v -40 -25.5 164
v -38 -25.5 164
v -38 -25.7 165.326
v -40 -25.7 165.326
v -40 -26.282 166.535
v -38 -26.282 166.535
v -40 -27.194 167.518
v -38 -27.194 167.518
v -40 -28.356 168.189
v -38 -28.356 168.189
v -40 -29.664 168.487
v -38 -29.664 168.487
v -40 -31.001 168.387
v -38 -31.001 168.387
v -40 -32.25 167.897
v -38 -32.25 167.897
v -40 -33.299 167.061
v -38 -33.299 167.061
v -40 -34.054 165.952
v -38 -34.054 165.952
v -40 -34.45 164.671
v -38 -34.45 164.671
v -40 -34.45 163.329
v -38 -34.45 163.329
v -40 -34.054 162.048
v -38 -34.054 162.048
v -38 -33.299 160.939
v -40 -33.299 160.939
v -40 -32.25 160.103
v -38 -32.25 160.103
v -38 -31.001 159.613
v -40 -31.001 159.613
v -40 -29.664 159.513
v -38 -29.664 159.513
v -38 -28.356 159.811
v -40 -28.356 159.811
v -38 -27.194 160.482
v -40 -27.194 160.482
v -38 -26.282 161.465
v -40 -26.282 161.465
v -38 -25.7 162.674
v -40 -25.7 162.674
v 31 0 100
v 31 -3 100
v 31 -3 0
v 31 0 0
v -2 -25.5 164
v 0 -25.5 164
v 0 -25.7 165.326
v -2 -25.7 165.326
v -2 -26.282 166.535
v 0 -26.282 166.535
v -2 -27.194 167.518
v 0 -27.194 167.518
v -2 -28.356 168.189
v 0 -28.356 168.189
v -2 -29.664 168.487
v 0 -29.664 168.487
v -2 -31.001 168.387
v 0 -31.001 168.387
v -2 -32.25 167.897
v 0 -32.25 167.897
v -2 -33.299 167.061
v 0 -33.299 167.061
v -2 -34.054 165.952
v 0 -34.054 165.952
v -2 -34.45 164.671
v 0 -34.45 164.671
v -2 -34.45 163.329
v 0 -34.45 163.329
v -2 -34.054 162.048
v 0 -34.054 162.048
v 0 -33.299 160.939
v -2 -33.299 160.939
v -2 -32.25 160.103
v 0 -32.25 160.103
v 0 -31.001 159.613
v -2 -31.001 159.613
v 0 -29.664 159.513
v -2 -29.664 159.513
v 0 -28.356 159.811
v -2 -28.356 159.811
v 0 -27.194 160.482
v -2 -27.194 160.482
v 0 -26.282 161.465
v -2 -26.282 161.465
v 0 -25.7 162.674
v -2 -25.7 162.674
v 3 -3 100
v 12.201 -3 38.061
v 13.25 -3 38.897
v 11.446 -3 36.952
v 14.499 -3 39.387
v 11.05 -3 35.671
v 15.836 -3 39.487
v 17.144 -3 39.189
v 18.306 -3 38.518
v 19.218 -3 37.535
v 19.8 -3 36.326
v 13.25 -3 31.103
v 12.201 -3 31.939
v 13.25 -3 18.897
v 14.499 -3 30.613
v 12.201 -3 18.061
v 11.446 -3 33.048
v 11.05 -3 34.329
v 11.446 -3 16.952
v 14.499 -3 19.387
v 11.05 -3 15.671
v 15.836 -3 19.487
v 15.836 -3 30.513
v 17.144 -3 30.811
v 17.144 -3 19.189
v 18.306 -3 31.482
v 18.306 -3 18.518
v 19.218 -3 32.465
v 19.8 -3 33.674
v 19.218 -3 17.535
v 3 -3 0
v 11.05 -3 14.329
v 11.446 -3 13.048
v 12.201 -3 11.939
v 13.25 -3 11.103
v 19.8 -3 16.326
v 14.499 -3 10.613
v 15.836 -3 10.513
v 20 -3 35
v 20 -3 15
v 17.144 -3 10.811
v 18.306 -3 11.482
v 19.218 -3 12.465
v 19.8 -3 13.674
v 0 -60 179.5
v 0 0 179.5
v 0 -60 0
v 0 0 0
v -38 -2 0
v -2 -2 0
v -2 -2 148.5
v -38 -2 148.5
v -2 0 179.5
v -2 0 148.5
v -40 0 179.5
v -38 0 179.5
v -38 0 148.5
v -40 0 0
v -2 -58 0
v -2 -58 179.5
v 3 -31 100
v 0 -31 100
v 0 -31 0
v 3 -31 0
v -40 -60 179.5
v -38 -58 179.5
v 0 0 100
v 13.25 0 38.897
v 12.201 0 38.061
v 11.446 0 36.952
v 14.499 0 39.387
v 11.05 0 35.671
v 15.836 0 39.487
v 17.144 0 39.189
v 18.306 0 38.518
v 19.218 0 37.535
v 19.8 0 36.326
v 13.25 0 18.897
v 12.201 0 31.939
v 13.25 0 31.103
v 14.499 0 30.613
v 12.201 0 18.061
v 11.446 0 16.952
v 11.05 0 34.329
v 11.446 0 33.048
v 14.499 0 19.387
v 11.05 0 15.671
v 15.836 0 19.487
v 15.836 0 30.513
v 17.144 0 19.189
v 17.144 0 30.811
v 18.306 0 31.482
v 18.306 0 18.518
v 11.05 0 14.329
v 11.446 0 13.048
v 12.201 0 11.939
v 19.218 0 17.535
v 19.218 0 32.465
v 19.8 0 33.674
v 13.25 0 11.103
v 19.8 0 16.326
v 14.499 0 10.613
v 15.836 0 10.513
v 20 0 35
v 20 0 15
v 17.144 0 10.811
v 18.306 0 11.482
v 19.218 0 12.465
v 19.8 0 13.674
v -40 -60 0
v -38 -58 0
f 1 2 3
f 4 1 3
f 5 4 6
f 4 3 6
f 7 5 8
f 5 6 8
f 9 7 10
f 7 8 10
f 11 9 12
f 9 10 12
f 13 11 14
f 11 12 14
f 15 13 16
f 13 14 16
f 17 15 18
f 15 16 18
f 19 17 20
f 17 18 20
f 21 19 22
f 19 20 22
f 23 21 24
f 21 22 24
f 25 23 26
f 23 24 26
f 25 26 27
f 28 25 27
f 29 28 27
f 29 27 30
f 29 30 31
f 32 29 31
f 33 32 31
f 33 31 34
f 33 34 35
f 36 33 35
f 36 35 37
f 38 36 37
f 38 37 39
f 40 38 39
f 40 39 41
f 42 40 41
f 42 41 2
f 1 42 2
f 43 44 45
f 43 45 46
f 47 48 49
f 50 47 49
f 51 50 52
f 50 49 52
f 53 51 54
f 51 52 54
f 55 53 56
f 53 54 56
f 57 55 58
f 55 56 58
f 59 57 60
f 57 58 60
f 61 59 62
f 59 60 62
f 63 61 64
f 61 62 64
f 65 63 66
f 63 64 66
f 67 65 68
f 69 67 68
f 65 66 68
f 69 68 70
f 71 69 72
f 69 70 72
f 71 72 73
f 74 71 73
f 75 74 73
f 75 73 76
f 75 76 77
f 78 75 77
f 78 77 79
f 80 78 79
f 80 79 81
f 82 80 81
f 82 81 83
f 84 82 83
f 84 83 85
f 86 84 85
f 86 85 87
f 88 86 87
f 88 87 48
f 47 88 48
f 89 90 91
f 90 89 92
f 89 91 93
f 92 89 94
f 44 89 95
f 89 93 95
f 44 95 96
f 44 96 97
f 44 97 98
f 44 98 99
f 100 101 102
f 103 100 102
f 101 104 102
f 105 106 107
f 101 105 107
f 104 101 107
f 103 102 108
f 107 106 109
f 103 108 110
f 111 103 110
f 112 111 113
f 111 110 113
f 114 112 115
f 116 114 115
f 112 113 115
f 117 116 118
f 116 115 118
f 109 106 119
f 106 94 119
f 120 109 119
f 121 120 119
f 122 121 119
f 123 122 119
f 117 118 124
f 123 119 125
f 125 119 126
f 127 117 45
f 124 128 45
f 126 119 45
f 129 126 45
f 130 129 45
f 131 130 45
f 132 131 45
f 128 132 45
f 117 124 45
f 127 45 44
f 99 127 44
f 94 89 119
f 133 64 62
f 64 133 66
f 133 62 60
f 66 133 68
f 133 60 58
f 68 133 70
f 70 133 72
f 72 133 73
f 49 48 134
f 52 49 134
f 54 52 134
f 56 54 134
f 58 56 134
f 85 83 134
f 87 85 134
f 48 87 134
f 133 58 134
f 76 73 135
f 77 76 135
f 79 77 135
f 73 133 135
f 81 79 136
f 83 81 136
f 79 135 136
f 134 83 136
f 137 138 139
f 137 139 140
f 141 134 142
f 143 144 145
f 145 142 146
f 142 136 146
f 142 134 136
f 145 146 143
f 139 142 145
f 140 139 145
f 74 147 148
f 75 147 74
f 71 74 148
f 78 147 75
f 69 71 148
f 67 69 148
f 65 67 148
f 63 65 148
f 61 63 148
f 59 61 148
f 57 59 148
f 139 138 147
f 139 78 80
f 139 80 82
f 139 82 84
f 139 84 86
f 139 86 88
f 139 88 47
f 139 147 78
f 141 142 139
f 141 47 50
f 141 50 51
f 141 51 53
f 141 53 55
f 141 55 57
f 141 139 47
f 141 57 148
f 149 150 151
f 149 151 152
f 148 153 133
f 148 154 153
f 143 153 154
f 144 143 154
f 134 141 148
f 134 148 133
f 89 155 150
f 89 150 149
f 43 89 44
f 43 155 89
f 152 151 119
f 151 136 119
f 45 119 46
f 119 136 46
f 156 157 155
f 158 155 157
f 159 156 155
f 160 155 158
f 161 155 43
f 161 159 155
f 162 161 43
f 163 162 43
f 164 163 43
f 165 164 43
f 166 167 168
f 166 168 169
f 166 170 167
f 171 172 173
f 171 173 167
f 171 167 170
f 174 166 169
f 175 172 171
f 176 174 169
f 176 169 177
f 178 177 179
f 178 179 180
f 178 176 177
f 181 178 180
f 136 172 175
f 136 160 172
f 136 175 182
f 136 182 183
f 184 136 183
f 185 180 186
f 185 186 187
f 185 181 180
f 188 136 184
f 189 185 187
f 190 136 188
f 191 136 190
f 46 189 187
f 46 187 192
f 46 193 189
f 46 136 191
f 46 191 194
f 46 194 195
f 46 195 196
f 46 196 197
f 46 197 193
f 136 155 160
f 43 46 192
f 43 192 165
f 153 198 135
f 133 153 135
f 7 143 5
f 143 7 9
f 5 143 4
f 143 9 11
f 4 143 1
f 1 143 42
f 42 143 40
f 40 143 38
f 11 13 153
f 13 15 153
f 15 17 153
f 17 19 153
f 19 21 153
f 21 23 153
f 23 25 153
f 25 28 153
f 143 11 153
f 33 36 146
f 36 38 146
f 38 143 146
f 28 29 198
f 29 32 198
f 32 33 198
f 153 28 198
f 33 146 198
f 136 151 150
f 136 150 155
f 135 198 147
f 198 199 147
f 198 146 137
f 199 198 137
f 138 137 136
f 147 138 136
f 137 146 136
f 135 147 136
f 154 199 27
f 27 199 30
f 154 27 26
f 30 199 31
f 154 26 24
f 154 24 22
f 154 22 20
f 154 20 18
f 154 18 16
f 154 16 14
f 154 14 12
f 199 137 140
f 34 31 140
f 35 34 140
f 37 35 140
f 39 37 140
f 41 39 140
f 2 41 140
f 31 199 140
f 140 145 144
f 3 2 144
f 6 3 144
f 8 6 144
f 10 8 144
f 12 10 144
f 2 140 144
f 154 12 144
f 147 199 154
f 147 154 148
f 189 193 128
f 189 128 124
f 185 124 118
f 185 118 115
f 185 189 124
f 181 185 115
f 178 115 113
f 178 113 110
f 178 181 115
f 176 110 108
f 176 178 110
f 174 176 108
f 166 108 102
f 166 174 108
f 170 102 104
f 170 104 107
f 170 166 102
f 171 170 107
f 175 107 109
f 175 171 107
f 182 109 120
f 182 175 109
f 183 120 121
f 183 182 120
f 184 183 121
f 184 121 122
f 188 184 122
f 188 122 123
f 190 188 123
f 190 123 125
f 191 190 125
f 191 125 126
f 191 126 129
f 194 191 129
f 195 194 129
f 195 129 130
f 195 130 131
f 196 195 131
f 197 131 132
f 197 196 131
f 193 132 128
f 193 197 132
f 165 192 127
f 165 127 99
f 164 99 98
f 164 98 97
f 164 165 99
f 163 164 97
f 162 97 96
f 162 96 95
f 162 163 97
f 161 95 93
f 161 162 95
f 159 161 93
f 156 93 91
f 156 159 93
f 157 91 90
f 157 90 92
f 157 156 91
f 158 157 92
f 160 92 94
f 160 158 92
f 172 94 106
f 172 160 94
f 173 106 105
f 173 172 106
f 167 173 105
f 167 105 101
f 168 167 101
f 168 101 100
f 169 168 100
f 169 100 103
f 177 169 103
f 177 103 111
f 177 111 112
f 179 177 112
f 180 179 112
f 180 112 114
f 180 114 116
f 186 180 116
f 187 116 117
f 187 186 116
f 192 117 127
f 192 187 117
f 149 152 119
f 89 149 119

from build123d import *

# Parameters (mm, degrees)
F4_DEPTH  = 179.5
F3_W      = 31
F3_H      = 31
F5_DEPTH  = 100
F6_T      = -2
F7_T      = -3
F8_W      = 36
F8_H      = 31
F9_DEPTH  = 2
F10_R     = 4.5
F11_DEPTH = 3
F12_R     = 4.5
F13_DEPTH = 40.001


with BuildPart() as f4:
    # F3 (on Top) → F4 (new body)
    with BuildSketch(Plane.XY):
        Polygon((0, -31), (0, 0), (-40, 0), (-40, -60), (0, -60), align=None)
    extrude(amount=F4_DEPTH)

    # F6
    f6_openings = [f4.faces().sort_by_distance(p)[0] for p in [
        (-20, -30, 179.5),
        (-20, -30, 0),
    ]]
    offset(amount=F6_T, openings=f6_openings)

    # F8 (on face) → F9 (cut, through all)
    with BuildSketch(Plane(origin=(0, 0, 0), x_dir=(-1, 0, 0), z_dir=(0, 1, 0))):
        with Locations((20, 164)):
            Rectangle(F8_W, F8_H)
    extrude(amount=-F9_DEPTH, mode=Mode.SUBTRACT)

    # F12 (on Right) → F13 (cut, through all)
    with BuildSketch(Plane.YZ):
        with Locations((-30, 164)):
            Circle(F12_R)
    extrude(amount=-F13_DEPTH, mode=Mode.SUBTRACT)


with BuildPart() as f5:
    # F3 (on Top) → F5 (new body)
    with BuildSketch(Plane.XY):
        with Locations((15.5, -15.5)):
            Rectangle(F3_W, F3_H)
    extrude(amount=F5_DEPTH)

    # F7
    f7_openings = [f5.faces().sort_by_distance(p)[0] for p in [
        (15.5, -15.5, 100),
        (15.5, -31, 50),
        (31, -15.5, 50),
        (15.5, -15.5, 0),
    ]]
    offset(amount=F7_T, openings=f7_openings)

    # F10 (on Front) → F11 (cut, through all)
    with BuildSketch(Plane.XZ):
        with Locations((15.5, 35)):
            Circle(F10_R)
        with Locations((15.5, 15)):
            Circle(F10_R)
    extrude(amount=F11_DEPTH, mode=Mode.SUBTRACT)


solid = Compound([f4.part, f5.part])
